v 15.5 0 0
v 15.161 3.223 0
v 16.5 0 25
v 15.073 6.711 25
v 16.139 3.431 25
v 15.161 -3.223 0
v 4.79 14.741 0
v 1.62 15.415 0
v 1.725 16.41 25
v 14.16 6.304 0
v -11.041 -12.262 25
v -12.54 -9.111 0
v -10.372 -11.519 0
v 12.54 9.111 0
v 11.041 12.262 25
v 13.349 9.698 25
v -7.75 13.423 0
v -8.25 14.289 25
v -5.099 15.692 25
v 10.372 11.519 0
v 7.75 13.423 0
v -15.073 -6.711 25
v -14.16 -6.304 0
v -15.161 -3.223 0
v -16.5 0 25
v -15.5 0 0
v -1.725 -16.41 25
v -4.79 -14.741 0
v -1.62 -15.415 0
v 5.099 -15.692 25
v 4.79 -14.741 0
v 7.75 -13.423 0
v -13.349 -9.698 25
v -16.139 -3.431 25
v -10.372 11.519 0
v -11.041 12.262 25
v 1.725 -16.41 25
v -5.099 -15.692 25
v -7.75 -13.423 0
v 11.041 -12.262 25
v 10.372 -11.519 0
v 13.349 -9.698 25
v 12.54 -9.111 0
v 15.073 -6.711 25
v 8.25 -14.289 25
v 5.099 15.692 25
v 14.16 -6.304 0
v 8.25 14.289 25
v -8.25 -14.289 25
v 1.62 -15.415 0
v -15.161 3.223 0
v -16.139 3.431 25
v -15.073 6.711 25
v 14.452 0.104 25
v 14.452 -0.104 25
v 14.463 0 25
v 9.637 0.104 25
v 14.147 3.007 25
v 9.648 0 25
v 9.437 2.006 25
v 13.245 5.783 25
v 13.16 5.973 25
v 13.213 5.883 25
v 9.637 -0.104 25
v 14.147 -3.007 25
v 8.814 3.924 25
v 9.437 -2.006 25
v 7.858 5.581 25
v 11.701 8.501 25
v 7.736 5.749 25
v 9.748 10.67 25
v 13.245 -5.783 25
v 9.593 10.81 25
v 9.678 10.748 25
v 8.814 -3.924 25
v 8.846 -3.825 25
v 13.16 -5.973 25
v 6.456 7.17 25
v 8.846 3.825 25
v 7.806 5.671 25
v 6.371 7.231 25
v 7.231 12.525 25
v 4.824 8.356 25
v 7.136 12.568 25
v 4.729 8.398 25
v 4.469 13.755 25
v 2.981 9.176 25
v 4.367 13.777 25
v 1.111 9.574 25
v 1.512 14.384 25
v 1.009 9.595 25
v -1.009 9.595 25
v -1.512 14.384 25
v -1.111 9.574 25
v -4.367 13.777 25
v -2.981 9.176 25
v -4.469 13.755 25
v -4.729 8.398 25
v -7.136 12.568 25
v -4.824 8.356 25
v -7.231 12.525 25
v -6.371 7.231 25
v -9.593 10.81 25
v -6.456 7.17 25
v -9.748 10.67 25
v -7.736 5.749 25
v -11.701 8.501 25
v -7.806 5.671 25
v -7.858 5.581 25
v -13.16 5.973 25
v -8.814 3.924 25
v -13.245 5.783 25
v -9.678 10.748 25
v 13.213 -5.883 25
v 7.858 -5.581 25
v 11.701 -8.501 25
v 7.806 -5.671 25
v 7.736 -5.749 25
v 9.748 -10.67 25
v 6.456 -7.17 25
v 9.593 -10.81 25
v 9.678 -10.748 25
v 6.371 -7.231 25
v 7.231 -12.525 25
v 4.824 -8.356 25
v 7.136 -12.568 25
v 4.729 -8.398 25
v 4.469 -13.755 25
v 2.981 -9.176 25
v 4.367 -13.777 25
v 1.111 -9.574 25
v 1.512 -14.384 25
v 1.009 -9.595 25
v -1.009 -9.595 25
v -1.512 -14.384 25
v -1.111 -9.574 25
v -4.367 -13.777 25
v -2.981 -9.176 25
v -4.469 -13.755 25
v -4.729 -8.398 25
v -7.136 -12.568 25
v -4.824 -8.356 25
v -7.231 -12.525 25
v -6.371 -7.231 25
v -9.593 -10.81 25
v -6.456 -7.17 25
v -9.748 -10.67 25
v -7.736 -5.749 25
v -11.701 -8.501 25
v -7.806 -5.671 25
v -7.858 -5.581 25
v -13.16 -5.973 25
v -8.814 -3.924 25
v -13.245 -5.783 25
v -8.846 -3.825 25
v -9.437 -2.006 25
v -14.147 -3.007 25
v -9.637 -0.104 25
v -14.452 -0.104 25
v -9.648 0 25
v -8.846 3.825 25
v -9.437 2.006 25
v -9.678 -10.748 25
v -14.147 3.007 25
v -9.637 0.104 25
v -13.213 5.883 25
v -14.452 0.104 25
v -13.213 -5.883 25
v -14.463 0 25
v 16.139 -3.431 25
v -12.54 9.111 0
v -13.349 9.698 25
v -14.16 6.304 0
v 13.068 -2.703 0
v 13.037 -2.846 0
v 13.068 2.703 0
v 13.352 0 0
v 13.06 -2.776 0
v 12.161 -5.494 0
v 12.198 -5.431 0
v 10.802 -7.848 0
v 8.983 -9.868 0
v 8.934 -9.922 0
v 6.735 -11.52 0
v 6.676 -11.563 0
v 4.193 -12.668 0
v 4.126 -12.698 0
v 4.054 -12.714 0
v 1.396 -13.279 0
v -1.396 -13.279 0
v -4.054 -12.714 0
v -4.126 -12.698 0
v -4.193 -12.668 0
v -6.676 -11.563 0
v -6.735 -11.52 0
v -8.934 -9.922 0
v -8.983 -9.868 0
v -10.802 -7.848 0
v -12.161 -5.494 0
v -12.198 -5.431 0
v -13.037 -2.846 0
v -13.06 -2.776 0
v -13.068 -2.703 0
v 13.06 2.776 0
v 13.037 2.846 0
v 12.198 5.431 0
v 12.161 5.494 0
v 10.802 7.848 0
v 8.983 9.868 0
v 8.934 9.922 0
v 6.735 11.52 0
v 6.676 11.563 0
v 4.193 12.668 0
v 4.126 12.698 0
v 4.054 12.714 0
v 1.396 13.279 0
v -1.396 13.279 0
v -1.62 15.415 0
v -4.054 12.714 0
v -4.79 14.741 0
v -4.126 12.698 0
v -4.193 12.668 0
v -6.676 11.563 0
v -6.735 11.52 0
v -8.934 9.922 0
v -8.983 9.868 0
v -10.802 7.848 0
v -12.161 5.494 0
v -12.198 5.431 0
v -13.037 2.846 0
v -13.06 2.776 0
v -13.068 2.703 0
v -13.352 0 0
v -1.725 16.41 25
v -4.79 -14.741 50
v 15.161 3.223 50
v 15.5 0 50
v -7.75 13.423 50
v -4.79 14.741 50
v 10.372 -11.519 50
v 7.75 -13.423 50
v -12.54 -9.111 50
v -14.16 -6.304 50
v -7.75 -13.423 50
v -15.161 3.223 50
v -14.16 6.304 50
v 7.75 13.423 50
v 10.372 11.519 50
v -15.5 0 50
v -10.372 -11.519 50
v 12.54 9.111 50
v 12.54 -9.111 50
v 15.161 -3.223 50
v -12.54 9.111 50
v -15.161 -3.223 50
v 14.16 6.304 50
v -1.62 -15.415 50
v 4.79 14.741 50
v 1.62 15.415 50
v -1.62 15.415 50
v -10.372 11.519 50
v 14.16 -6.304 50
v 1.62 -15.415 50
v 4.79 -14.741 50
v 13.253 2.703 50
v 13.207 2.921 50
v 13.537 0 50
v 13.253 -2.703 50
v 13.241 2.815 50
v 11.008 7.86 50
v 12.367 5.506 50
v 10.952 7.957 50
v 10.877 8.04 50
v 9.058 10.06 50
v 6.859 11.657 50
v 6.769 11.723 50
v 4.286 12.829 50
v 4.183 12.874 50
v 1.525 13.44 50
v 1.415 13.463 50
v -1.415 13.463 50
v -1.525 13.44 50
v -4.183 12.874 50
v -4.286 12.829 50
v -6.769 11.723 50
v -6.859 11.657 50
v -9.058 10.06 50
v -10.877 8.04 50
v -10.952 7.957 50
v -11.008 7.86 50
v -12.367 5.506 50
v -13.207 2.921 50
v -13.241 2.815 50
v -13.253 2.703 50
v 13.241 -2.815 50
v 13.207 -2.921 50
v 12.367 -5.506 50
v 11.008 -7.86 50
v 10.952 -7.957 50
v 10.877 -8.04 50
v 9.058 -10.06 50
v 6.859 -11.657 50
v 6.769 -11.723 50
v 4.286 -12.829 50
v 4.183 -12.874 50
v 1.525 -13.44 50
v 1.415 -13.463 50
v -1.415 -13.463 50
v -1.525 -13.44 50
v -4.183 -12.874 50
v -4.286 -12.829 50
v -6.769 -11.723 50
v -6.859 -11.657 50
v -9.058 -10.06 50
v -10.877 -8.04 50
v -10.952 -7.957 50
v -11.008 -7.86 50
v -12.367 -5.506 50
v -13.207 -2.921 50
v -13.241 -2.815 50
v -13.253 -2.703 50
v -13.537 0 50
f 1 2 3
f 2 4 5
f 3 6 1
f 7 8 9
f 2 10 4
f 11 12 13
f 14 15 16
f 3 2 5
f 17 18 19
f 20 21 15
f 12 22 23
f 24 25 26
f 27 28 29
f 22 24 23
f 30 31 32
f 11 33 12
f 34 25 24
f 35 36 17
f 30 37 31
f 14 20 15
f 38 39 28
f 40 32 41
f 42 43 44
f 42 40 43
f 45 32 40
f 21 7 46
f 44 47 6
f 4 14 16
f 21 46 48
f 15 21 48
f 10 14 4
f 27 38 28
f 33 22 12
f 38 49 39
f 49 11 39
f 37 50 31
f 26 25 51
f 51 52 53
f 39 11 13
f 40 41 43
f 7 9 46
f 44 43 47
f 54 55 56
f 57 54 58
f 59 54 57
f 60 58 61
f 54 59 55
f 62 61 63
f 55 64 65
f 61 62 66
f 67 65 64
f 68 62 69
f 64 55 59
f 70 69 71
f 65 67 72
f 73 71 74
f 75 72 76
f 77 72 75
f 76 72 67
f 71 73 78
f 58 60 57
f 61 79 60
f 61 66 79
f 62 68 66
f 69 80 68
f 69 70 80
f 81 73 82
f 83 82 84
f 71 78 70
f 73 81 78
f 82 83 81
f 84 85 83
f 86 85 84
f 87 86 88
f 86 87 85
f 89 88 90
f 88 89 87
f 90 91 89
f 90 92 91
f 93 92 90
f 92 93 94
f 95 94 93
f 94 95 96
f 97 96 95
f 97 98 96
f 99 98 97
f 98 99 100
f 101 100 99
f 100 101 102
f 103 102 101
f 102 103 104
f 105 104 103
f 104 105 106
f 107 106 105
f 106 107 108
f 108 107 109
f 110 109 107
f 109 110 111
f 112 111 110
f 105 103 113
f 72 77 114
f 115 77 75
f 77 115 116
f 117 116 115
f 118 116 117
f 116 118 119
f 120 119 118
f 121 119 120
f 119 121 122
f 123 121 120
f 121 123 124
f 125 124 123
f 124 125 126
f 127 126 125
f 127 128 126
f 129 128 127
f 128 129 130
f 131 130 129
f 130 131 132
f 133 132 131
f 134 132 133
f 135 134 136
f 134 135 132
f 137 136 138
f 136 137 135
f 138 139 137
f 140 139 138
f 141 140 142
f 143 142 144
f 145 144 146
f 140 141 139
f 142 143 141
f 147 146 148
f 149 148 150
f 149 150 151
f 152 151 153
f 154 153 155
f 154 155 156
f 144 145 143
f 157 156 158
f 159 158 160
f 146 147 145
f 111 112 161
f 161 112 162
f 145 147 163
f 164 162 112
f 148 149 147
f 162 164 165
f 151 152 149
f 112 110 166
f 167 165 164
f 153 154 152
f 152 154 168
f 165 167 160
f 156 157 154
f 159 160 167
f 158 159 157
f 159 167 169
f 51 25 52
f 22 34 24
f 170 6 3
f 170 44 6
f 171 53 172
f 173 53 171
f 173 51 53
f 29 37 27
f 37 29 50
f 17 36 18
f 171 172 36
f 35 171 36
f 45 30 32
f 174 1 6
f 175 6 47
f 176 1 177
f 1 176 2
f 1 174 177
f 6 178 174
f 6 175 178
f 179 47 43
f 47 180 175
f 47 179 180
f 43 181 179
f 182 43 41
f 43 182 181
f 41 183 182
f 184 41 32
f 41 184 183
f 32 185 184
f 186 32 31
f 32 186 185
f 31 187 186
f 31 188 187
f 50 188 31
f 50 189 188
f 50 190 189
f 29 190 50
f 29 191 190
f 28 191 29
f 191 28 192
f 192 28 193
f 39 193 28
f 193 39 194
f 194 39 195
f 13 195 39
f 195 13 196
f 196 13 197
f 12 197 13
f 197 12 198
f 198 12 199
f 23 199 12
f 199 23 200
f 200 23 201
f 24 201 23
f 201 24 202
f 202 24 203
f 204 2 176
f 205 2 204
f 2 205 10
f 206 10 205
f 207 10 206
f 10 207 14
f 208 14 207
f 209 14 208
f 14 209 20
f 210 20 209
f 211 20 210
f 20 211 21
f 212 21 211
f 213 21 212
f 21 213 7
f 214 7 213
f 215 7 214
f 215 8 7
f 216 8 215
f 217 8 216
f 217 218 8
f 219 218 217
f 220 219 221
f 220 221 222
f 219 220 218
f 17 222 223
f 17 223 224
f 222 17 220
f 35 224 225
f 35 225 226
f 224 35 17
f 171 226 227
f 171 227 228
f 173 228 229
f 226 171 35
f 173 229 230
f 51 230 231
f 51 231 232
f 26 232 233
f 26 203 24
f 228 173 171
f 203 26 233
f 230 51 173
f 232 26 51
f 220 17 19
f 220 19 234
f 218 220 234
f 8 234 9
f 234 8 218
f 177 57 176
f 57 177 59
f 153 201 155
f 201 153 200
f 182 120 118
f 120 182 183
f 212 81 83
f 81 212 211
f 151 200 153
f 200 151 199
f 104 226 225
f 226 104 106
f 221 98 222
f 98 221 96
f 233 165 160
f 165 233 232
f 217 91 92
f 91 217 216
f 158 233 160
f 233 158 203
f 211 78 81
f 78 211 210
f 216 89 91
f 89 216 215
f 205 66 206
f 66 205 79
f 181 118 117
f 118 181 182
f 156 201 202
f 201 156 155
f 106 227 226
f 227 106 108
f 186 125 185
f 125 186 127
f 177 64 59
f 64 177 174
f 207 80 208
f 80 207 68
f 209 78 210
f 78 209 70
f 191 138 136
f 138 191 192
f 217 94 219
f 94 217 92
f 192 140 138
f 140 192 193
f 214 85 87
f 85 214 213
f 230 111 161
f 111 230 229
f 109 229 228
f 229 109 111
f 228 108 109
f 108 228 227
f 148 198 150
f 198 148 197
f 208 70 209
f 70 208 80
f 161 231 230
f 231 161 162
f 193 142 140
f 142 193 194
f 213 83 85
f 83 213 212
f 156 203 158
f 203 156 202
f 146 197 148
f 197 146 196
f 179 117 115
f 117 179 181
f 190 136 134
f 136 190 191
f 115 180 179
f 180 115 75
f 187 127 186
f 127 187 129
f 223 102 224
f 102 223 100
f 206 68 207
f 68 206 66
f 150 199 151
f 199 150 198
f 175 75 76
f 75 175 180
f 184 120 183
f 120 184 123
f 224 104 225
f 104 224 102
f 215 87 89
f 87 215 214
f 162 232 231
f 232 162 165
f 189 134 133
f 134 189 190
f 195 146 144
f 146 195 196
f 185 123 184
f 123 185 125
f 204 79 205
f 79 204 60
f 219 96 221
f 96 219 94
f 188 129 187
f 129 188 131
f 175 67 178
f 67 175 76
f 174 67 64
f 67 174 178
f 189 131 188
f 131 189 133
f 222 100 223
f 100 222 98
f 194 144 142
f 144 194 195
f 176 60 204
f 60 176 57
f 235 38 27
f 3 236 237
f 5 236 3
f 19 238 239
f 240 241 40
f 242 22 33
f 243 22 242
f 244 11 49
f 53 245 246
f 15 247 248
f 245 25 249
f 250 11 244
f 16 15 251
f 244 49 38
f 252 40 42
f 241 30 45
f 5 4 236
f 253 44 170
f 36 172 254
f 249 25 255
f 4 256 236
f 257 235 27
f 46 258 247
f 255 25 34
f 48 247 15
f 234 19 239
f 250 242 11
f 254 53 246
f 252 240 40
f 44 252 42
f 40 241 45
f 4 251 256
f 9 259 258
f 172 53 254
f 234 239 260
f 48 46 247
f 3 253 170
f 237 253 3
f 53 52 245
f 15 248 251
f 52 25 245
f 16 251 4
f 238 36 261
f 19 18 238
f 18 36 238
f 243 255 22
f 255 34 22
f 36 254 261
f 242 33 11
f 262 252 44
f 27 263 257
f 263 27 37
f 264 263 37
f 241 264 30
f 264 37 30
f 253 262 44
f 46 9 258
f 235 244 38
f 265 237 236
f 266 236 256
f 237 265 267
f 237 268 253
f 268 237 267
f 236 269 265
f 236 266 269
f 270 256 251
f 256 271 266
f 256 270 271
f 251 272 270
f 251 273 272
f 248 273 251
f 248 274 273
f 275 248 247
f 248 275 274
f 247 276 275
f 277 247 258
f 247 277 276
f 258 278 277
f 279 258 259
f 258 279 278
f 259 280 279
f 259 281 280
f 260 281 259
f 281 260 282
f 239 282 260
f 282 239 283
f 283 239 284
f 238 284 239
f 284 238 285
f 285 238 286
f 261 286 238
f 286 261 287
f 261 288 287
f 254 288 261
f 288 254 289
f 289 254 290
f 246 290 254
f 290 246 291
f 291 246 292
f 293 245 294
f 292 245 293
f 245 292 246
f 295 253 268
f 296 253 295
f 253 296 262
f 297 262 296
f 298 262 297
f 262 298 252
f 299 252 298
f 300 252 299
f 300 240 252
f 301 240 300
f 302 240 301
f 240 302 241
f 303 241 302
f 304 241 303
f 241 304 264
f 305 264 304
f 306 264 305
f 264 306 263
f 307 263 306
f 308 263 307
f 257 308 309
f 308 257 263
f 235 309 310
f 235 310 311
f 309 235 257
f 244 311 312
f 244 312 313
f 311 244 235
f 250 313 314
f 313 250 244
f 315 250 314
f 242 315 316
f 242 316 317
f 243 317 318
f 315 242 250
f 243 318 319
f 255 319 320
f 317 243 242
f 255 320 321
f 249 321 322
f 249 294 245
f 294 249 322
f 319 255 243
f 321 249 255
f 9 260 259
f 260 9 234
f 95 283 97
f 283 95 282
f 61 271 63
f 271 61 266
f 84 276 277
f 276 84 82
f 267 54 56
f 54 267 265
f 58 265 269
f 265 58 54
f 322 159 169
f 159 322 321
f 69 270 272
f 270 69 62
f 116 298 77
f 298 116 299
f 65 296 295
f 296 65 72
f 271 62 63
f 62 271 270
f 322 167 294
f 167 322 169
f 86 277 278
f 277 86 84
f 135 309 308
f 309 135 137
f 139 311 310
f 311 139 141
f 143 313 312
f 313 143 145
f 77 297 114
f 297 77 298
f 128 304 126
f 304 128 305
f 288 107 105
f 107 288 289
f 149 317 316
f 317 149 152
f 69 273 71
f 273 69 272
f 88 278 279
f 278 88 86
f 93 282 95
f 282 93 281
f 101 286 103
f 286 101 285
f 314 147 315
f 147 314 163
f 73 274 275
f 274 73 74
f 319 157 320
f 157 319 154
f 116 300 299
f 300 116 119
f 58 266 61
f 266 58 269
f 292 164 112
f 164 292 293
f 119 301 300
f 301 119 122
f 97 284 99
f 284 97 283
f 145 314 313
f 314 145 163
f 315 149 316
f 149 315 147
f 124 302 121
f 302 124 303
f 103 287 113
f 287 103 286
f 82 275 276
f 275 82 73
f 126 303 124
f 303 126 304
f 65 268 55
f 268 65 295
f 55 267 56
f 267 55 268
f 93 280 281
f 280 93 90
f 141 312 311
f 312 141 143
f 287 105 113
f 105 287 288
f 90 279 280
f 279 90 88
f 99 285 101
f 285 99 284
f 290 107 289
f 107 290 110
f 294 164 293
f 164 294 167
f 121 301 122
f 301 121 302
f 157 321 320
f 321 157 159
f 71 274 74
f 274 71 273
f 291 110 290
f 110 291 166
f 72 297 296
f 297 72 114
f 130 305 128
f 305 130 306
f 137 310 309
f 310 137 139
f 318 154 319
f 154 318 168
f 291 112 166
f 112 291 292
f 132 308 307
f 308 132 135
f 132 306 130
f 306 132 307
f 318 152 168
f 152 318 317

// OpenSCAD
difference()
{
	cylinder(h=25,d1=31,d2=33);
	translate([0,0,-1]) cylinder(h=27,d1=27,d2=19);
}
translate([0,0,25]) difference()
{
	cylinder(h=25,d1=33,d2=31);
	translate([0,0,-1]) cylinder(h=27,d1=29,d2=27);
}
